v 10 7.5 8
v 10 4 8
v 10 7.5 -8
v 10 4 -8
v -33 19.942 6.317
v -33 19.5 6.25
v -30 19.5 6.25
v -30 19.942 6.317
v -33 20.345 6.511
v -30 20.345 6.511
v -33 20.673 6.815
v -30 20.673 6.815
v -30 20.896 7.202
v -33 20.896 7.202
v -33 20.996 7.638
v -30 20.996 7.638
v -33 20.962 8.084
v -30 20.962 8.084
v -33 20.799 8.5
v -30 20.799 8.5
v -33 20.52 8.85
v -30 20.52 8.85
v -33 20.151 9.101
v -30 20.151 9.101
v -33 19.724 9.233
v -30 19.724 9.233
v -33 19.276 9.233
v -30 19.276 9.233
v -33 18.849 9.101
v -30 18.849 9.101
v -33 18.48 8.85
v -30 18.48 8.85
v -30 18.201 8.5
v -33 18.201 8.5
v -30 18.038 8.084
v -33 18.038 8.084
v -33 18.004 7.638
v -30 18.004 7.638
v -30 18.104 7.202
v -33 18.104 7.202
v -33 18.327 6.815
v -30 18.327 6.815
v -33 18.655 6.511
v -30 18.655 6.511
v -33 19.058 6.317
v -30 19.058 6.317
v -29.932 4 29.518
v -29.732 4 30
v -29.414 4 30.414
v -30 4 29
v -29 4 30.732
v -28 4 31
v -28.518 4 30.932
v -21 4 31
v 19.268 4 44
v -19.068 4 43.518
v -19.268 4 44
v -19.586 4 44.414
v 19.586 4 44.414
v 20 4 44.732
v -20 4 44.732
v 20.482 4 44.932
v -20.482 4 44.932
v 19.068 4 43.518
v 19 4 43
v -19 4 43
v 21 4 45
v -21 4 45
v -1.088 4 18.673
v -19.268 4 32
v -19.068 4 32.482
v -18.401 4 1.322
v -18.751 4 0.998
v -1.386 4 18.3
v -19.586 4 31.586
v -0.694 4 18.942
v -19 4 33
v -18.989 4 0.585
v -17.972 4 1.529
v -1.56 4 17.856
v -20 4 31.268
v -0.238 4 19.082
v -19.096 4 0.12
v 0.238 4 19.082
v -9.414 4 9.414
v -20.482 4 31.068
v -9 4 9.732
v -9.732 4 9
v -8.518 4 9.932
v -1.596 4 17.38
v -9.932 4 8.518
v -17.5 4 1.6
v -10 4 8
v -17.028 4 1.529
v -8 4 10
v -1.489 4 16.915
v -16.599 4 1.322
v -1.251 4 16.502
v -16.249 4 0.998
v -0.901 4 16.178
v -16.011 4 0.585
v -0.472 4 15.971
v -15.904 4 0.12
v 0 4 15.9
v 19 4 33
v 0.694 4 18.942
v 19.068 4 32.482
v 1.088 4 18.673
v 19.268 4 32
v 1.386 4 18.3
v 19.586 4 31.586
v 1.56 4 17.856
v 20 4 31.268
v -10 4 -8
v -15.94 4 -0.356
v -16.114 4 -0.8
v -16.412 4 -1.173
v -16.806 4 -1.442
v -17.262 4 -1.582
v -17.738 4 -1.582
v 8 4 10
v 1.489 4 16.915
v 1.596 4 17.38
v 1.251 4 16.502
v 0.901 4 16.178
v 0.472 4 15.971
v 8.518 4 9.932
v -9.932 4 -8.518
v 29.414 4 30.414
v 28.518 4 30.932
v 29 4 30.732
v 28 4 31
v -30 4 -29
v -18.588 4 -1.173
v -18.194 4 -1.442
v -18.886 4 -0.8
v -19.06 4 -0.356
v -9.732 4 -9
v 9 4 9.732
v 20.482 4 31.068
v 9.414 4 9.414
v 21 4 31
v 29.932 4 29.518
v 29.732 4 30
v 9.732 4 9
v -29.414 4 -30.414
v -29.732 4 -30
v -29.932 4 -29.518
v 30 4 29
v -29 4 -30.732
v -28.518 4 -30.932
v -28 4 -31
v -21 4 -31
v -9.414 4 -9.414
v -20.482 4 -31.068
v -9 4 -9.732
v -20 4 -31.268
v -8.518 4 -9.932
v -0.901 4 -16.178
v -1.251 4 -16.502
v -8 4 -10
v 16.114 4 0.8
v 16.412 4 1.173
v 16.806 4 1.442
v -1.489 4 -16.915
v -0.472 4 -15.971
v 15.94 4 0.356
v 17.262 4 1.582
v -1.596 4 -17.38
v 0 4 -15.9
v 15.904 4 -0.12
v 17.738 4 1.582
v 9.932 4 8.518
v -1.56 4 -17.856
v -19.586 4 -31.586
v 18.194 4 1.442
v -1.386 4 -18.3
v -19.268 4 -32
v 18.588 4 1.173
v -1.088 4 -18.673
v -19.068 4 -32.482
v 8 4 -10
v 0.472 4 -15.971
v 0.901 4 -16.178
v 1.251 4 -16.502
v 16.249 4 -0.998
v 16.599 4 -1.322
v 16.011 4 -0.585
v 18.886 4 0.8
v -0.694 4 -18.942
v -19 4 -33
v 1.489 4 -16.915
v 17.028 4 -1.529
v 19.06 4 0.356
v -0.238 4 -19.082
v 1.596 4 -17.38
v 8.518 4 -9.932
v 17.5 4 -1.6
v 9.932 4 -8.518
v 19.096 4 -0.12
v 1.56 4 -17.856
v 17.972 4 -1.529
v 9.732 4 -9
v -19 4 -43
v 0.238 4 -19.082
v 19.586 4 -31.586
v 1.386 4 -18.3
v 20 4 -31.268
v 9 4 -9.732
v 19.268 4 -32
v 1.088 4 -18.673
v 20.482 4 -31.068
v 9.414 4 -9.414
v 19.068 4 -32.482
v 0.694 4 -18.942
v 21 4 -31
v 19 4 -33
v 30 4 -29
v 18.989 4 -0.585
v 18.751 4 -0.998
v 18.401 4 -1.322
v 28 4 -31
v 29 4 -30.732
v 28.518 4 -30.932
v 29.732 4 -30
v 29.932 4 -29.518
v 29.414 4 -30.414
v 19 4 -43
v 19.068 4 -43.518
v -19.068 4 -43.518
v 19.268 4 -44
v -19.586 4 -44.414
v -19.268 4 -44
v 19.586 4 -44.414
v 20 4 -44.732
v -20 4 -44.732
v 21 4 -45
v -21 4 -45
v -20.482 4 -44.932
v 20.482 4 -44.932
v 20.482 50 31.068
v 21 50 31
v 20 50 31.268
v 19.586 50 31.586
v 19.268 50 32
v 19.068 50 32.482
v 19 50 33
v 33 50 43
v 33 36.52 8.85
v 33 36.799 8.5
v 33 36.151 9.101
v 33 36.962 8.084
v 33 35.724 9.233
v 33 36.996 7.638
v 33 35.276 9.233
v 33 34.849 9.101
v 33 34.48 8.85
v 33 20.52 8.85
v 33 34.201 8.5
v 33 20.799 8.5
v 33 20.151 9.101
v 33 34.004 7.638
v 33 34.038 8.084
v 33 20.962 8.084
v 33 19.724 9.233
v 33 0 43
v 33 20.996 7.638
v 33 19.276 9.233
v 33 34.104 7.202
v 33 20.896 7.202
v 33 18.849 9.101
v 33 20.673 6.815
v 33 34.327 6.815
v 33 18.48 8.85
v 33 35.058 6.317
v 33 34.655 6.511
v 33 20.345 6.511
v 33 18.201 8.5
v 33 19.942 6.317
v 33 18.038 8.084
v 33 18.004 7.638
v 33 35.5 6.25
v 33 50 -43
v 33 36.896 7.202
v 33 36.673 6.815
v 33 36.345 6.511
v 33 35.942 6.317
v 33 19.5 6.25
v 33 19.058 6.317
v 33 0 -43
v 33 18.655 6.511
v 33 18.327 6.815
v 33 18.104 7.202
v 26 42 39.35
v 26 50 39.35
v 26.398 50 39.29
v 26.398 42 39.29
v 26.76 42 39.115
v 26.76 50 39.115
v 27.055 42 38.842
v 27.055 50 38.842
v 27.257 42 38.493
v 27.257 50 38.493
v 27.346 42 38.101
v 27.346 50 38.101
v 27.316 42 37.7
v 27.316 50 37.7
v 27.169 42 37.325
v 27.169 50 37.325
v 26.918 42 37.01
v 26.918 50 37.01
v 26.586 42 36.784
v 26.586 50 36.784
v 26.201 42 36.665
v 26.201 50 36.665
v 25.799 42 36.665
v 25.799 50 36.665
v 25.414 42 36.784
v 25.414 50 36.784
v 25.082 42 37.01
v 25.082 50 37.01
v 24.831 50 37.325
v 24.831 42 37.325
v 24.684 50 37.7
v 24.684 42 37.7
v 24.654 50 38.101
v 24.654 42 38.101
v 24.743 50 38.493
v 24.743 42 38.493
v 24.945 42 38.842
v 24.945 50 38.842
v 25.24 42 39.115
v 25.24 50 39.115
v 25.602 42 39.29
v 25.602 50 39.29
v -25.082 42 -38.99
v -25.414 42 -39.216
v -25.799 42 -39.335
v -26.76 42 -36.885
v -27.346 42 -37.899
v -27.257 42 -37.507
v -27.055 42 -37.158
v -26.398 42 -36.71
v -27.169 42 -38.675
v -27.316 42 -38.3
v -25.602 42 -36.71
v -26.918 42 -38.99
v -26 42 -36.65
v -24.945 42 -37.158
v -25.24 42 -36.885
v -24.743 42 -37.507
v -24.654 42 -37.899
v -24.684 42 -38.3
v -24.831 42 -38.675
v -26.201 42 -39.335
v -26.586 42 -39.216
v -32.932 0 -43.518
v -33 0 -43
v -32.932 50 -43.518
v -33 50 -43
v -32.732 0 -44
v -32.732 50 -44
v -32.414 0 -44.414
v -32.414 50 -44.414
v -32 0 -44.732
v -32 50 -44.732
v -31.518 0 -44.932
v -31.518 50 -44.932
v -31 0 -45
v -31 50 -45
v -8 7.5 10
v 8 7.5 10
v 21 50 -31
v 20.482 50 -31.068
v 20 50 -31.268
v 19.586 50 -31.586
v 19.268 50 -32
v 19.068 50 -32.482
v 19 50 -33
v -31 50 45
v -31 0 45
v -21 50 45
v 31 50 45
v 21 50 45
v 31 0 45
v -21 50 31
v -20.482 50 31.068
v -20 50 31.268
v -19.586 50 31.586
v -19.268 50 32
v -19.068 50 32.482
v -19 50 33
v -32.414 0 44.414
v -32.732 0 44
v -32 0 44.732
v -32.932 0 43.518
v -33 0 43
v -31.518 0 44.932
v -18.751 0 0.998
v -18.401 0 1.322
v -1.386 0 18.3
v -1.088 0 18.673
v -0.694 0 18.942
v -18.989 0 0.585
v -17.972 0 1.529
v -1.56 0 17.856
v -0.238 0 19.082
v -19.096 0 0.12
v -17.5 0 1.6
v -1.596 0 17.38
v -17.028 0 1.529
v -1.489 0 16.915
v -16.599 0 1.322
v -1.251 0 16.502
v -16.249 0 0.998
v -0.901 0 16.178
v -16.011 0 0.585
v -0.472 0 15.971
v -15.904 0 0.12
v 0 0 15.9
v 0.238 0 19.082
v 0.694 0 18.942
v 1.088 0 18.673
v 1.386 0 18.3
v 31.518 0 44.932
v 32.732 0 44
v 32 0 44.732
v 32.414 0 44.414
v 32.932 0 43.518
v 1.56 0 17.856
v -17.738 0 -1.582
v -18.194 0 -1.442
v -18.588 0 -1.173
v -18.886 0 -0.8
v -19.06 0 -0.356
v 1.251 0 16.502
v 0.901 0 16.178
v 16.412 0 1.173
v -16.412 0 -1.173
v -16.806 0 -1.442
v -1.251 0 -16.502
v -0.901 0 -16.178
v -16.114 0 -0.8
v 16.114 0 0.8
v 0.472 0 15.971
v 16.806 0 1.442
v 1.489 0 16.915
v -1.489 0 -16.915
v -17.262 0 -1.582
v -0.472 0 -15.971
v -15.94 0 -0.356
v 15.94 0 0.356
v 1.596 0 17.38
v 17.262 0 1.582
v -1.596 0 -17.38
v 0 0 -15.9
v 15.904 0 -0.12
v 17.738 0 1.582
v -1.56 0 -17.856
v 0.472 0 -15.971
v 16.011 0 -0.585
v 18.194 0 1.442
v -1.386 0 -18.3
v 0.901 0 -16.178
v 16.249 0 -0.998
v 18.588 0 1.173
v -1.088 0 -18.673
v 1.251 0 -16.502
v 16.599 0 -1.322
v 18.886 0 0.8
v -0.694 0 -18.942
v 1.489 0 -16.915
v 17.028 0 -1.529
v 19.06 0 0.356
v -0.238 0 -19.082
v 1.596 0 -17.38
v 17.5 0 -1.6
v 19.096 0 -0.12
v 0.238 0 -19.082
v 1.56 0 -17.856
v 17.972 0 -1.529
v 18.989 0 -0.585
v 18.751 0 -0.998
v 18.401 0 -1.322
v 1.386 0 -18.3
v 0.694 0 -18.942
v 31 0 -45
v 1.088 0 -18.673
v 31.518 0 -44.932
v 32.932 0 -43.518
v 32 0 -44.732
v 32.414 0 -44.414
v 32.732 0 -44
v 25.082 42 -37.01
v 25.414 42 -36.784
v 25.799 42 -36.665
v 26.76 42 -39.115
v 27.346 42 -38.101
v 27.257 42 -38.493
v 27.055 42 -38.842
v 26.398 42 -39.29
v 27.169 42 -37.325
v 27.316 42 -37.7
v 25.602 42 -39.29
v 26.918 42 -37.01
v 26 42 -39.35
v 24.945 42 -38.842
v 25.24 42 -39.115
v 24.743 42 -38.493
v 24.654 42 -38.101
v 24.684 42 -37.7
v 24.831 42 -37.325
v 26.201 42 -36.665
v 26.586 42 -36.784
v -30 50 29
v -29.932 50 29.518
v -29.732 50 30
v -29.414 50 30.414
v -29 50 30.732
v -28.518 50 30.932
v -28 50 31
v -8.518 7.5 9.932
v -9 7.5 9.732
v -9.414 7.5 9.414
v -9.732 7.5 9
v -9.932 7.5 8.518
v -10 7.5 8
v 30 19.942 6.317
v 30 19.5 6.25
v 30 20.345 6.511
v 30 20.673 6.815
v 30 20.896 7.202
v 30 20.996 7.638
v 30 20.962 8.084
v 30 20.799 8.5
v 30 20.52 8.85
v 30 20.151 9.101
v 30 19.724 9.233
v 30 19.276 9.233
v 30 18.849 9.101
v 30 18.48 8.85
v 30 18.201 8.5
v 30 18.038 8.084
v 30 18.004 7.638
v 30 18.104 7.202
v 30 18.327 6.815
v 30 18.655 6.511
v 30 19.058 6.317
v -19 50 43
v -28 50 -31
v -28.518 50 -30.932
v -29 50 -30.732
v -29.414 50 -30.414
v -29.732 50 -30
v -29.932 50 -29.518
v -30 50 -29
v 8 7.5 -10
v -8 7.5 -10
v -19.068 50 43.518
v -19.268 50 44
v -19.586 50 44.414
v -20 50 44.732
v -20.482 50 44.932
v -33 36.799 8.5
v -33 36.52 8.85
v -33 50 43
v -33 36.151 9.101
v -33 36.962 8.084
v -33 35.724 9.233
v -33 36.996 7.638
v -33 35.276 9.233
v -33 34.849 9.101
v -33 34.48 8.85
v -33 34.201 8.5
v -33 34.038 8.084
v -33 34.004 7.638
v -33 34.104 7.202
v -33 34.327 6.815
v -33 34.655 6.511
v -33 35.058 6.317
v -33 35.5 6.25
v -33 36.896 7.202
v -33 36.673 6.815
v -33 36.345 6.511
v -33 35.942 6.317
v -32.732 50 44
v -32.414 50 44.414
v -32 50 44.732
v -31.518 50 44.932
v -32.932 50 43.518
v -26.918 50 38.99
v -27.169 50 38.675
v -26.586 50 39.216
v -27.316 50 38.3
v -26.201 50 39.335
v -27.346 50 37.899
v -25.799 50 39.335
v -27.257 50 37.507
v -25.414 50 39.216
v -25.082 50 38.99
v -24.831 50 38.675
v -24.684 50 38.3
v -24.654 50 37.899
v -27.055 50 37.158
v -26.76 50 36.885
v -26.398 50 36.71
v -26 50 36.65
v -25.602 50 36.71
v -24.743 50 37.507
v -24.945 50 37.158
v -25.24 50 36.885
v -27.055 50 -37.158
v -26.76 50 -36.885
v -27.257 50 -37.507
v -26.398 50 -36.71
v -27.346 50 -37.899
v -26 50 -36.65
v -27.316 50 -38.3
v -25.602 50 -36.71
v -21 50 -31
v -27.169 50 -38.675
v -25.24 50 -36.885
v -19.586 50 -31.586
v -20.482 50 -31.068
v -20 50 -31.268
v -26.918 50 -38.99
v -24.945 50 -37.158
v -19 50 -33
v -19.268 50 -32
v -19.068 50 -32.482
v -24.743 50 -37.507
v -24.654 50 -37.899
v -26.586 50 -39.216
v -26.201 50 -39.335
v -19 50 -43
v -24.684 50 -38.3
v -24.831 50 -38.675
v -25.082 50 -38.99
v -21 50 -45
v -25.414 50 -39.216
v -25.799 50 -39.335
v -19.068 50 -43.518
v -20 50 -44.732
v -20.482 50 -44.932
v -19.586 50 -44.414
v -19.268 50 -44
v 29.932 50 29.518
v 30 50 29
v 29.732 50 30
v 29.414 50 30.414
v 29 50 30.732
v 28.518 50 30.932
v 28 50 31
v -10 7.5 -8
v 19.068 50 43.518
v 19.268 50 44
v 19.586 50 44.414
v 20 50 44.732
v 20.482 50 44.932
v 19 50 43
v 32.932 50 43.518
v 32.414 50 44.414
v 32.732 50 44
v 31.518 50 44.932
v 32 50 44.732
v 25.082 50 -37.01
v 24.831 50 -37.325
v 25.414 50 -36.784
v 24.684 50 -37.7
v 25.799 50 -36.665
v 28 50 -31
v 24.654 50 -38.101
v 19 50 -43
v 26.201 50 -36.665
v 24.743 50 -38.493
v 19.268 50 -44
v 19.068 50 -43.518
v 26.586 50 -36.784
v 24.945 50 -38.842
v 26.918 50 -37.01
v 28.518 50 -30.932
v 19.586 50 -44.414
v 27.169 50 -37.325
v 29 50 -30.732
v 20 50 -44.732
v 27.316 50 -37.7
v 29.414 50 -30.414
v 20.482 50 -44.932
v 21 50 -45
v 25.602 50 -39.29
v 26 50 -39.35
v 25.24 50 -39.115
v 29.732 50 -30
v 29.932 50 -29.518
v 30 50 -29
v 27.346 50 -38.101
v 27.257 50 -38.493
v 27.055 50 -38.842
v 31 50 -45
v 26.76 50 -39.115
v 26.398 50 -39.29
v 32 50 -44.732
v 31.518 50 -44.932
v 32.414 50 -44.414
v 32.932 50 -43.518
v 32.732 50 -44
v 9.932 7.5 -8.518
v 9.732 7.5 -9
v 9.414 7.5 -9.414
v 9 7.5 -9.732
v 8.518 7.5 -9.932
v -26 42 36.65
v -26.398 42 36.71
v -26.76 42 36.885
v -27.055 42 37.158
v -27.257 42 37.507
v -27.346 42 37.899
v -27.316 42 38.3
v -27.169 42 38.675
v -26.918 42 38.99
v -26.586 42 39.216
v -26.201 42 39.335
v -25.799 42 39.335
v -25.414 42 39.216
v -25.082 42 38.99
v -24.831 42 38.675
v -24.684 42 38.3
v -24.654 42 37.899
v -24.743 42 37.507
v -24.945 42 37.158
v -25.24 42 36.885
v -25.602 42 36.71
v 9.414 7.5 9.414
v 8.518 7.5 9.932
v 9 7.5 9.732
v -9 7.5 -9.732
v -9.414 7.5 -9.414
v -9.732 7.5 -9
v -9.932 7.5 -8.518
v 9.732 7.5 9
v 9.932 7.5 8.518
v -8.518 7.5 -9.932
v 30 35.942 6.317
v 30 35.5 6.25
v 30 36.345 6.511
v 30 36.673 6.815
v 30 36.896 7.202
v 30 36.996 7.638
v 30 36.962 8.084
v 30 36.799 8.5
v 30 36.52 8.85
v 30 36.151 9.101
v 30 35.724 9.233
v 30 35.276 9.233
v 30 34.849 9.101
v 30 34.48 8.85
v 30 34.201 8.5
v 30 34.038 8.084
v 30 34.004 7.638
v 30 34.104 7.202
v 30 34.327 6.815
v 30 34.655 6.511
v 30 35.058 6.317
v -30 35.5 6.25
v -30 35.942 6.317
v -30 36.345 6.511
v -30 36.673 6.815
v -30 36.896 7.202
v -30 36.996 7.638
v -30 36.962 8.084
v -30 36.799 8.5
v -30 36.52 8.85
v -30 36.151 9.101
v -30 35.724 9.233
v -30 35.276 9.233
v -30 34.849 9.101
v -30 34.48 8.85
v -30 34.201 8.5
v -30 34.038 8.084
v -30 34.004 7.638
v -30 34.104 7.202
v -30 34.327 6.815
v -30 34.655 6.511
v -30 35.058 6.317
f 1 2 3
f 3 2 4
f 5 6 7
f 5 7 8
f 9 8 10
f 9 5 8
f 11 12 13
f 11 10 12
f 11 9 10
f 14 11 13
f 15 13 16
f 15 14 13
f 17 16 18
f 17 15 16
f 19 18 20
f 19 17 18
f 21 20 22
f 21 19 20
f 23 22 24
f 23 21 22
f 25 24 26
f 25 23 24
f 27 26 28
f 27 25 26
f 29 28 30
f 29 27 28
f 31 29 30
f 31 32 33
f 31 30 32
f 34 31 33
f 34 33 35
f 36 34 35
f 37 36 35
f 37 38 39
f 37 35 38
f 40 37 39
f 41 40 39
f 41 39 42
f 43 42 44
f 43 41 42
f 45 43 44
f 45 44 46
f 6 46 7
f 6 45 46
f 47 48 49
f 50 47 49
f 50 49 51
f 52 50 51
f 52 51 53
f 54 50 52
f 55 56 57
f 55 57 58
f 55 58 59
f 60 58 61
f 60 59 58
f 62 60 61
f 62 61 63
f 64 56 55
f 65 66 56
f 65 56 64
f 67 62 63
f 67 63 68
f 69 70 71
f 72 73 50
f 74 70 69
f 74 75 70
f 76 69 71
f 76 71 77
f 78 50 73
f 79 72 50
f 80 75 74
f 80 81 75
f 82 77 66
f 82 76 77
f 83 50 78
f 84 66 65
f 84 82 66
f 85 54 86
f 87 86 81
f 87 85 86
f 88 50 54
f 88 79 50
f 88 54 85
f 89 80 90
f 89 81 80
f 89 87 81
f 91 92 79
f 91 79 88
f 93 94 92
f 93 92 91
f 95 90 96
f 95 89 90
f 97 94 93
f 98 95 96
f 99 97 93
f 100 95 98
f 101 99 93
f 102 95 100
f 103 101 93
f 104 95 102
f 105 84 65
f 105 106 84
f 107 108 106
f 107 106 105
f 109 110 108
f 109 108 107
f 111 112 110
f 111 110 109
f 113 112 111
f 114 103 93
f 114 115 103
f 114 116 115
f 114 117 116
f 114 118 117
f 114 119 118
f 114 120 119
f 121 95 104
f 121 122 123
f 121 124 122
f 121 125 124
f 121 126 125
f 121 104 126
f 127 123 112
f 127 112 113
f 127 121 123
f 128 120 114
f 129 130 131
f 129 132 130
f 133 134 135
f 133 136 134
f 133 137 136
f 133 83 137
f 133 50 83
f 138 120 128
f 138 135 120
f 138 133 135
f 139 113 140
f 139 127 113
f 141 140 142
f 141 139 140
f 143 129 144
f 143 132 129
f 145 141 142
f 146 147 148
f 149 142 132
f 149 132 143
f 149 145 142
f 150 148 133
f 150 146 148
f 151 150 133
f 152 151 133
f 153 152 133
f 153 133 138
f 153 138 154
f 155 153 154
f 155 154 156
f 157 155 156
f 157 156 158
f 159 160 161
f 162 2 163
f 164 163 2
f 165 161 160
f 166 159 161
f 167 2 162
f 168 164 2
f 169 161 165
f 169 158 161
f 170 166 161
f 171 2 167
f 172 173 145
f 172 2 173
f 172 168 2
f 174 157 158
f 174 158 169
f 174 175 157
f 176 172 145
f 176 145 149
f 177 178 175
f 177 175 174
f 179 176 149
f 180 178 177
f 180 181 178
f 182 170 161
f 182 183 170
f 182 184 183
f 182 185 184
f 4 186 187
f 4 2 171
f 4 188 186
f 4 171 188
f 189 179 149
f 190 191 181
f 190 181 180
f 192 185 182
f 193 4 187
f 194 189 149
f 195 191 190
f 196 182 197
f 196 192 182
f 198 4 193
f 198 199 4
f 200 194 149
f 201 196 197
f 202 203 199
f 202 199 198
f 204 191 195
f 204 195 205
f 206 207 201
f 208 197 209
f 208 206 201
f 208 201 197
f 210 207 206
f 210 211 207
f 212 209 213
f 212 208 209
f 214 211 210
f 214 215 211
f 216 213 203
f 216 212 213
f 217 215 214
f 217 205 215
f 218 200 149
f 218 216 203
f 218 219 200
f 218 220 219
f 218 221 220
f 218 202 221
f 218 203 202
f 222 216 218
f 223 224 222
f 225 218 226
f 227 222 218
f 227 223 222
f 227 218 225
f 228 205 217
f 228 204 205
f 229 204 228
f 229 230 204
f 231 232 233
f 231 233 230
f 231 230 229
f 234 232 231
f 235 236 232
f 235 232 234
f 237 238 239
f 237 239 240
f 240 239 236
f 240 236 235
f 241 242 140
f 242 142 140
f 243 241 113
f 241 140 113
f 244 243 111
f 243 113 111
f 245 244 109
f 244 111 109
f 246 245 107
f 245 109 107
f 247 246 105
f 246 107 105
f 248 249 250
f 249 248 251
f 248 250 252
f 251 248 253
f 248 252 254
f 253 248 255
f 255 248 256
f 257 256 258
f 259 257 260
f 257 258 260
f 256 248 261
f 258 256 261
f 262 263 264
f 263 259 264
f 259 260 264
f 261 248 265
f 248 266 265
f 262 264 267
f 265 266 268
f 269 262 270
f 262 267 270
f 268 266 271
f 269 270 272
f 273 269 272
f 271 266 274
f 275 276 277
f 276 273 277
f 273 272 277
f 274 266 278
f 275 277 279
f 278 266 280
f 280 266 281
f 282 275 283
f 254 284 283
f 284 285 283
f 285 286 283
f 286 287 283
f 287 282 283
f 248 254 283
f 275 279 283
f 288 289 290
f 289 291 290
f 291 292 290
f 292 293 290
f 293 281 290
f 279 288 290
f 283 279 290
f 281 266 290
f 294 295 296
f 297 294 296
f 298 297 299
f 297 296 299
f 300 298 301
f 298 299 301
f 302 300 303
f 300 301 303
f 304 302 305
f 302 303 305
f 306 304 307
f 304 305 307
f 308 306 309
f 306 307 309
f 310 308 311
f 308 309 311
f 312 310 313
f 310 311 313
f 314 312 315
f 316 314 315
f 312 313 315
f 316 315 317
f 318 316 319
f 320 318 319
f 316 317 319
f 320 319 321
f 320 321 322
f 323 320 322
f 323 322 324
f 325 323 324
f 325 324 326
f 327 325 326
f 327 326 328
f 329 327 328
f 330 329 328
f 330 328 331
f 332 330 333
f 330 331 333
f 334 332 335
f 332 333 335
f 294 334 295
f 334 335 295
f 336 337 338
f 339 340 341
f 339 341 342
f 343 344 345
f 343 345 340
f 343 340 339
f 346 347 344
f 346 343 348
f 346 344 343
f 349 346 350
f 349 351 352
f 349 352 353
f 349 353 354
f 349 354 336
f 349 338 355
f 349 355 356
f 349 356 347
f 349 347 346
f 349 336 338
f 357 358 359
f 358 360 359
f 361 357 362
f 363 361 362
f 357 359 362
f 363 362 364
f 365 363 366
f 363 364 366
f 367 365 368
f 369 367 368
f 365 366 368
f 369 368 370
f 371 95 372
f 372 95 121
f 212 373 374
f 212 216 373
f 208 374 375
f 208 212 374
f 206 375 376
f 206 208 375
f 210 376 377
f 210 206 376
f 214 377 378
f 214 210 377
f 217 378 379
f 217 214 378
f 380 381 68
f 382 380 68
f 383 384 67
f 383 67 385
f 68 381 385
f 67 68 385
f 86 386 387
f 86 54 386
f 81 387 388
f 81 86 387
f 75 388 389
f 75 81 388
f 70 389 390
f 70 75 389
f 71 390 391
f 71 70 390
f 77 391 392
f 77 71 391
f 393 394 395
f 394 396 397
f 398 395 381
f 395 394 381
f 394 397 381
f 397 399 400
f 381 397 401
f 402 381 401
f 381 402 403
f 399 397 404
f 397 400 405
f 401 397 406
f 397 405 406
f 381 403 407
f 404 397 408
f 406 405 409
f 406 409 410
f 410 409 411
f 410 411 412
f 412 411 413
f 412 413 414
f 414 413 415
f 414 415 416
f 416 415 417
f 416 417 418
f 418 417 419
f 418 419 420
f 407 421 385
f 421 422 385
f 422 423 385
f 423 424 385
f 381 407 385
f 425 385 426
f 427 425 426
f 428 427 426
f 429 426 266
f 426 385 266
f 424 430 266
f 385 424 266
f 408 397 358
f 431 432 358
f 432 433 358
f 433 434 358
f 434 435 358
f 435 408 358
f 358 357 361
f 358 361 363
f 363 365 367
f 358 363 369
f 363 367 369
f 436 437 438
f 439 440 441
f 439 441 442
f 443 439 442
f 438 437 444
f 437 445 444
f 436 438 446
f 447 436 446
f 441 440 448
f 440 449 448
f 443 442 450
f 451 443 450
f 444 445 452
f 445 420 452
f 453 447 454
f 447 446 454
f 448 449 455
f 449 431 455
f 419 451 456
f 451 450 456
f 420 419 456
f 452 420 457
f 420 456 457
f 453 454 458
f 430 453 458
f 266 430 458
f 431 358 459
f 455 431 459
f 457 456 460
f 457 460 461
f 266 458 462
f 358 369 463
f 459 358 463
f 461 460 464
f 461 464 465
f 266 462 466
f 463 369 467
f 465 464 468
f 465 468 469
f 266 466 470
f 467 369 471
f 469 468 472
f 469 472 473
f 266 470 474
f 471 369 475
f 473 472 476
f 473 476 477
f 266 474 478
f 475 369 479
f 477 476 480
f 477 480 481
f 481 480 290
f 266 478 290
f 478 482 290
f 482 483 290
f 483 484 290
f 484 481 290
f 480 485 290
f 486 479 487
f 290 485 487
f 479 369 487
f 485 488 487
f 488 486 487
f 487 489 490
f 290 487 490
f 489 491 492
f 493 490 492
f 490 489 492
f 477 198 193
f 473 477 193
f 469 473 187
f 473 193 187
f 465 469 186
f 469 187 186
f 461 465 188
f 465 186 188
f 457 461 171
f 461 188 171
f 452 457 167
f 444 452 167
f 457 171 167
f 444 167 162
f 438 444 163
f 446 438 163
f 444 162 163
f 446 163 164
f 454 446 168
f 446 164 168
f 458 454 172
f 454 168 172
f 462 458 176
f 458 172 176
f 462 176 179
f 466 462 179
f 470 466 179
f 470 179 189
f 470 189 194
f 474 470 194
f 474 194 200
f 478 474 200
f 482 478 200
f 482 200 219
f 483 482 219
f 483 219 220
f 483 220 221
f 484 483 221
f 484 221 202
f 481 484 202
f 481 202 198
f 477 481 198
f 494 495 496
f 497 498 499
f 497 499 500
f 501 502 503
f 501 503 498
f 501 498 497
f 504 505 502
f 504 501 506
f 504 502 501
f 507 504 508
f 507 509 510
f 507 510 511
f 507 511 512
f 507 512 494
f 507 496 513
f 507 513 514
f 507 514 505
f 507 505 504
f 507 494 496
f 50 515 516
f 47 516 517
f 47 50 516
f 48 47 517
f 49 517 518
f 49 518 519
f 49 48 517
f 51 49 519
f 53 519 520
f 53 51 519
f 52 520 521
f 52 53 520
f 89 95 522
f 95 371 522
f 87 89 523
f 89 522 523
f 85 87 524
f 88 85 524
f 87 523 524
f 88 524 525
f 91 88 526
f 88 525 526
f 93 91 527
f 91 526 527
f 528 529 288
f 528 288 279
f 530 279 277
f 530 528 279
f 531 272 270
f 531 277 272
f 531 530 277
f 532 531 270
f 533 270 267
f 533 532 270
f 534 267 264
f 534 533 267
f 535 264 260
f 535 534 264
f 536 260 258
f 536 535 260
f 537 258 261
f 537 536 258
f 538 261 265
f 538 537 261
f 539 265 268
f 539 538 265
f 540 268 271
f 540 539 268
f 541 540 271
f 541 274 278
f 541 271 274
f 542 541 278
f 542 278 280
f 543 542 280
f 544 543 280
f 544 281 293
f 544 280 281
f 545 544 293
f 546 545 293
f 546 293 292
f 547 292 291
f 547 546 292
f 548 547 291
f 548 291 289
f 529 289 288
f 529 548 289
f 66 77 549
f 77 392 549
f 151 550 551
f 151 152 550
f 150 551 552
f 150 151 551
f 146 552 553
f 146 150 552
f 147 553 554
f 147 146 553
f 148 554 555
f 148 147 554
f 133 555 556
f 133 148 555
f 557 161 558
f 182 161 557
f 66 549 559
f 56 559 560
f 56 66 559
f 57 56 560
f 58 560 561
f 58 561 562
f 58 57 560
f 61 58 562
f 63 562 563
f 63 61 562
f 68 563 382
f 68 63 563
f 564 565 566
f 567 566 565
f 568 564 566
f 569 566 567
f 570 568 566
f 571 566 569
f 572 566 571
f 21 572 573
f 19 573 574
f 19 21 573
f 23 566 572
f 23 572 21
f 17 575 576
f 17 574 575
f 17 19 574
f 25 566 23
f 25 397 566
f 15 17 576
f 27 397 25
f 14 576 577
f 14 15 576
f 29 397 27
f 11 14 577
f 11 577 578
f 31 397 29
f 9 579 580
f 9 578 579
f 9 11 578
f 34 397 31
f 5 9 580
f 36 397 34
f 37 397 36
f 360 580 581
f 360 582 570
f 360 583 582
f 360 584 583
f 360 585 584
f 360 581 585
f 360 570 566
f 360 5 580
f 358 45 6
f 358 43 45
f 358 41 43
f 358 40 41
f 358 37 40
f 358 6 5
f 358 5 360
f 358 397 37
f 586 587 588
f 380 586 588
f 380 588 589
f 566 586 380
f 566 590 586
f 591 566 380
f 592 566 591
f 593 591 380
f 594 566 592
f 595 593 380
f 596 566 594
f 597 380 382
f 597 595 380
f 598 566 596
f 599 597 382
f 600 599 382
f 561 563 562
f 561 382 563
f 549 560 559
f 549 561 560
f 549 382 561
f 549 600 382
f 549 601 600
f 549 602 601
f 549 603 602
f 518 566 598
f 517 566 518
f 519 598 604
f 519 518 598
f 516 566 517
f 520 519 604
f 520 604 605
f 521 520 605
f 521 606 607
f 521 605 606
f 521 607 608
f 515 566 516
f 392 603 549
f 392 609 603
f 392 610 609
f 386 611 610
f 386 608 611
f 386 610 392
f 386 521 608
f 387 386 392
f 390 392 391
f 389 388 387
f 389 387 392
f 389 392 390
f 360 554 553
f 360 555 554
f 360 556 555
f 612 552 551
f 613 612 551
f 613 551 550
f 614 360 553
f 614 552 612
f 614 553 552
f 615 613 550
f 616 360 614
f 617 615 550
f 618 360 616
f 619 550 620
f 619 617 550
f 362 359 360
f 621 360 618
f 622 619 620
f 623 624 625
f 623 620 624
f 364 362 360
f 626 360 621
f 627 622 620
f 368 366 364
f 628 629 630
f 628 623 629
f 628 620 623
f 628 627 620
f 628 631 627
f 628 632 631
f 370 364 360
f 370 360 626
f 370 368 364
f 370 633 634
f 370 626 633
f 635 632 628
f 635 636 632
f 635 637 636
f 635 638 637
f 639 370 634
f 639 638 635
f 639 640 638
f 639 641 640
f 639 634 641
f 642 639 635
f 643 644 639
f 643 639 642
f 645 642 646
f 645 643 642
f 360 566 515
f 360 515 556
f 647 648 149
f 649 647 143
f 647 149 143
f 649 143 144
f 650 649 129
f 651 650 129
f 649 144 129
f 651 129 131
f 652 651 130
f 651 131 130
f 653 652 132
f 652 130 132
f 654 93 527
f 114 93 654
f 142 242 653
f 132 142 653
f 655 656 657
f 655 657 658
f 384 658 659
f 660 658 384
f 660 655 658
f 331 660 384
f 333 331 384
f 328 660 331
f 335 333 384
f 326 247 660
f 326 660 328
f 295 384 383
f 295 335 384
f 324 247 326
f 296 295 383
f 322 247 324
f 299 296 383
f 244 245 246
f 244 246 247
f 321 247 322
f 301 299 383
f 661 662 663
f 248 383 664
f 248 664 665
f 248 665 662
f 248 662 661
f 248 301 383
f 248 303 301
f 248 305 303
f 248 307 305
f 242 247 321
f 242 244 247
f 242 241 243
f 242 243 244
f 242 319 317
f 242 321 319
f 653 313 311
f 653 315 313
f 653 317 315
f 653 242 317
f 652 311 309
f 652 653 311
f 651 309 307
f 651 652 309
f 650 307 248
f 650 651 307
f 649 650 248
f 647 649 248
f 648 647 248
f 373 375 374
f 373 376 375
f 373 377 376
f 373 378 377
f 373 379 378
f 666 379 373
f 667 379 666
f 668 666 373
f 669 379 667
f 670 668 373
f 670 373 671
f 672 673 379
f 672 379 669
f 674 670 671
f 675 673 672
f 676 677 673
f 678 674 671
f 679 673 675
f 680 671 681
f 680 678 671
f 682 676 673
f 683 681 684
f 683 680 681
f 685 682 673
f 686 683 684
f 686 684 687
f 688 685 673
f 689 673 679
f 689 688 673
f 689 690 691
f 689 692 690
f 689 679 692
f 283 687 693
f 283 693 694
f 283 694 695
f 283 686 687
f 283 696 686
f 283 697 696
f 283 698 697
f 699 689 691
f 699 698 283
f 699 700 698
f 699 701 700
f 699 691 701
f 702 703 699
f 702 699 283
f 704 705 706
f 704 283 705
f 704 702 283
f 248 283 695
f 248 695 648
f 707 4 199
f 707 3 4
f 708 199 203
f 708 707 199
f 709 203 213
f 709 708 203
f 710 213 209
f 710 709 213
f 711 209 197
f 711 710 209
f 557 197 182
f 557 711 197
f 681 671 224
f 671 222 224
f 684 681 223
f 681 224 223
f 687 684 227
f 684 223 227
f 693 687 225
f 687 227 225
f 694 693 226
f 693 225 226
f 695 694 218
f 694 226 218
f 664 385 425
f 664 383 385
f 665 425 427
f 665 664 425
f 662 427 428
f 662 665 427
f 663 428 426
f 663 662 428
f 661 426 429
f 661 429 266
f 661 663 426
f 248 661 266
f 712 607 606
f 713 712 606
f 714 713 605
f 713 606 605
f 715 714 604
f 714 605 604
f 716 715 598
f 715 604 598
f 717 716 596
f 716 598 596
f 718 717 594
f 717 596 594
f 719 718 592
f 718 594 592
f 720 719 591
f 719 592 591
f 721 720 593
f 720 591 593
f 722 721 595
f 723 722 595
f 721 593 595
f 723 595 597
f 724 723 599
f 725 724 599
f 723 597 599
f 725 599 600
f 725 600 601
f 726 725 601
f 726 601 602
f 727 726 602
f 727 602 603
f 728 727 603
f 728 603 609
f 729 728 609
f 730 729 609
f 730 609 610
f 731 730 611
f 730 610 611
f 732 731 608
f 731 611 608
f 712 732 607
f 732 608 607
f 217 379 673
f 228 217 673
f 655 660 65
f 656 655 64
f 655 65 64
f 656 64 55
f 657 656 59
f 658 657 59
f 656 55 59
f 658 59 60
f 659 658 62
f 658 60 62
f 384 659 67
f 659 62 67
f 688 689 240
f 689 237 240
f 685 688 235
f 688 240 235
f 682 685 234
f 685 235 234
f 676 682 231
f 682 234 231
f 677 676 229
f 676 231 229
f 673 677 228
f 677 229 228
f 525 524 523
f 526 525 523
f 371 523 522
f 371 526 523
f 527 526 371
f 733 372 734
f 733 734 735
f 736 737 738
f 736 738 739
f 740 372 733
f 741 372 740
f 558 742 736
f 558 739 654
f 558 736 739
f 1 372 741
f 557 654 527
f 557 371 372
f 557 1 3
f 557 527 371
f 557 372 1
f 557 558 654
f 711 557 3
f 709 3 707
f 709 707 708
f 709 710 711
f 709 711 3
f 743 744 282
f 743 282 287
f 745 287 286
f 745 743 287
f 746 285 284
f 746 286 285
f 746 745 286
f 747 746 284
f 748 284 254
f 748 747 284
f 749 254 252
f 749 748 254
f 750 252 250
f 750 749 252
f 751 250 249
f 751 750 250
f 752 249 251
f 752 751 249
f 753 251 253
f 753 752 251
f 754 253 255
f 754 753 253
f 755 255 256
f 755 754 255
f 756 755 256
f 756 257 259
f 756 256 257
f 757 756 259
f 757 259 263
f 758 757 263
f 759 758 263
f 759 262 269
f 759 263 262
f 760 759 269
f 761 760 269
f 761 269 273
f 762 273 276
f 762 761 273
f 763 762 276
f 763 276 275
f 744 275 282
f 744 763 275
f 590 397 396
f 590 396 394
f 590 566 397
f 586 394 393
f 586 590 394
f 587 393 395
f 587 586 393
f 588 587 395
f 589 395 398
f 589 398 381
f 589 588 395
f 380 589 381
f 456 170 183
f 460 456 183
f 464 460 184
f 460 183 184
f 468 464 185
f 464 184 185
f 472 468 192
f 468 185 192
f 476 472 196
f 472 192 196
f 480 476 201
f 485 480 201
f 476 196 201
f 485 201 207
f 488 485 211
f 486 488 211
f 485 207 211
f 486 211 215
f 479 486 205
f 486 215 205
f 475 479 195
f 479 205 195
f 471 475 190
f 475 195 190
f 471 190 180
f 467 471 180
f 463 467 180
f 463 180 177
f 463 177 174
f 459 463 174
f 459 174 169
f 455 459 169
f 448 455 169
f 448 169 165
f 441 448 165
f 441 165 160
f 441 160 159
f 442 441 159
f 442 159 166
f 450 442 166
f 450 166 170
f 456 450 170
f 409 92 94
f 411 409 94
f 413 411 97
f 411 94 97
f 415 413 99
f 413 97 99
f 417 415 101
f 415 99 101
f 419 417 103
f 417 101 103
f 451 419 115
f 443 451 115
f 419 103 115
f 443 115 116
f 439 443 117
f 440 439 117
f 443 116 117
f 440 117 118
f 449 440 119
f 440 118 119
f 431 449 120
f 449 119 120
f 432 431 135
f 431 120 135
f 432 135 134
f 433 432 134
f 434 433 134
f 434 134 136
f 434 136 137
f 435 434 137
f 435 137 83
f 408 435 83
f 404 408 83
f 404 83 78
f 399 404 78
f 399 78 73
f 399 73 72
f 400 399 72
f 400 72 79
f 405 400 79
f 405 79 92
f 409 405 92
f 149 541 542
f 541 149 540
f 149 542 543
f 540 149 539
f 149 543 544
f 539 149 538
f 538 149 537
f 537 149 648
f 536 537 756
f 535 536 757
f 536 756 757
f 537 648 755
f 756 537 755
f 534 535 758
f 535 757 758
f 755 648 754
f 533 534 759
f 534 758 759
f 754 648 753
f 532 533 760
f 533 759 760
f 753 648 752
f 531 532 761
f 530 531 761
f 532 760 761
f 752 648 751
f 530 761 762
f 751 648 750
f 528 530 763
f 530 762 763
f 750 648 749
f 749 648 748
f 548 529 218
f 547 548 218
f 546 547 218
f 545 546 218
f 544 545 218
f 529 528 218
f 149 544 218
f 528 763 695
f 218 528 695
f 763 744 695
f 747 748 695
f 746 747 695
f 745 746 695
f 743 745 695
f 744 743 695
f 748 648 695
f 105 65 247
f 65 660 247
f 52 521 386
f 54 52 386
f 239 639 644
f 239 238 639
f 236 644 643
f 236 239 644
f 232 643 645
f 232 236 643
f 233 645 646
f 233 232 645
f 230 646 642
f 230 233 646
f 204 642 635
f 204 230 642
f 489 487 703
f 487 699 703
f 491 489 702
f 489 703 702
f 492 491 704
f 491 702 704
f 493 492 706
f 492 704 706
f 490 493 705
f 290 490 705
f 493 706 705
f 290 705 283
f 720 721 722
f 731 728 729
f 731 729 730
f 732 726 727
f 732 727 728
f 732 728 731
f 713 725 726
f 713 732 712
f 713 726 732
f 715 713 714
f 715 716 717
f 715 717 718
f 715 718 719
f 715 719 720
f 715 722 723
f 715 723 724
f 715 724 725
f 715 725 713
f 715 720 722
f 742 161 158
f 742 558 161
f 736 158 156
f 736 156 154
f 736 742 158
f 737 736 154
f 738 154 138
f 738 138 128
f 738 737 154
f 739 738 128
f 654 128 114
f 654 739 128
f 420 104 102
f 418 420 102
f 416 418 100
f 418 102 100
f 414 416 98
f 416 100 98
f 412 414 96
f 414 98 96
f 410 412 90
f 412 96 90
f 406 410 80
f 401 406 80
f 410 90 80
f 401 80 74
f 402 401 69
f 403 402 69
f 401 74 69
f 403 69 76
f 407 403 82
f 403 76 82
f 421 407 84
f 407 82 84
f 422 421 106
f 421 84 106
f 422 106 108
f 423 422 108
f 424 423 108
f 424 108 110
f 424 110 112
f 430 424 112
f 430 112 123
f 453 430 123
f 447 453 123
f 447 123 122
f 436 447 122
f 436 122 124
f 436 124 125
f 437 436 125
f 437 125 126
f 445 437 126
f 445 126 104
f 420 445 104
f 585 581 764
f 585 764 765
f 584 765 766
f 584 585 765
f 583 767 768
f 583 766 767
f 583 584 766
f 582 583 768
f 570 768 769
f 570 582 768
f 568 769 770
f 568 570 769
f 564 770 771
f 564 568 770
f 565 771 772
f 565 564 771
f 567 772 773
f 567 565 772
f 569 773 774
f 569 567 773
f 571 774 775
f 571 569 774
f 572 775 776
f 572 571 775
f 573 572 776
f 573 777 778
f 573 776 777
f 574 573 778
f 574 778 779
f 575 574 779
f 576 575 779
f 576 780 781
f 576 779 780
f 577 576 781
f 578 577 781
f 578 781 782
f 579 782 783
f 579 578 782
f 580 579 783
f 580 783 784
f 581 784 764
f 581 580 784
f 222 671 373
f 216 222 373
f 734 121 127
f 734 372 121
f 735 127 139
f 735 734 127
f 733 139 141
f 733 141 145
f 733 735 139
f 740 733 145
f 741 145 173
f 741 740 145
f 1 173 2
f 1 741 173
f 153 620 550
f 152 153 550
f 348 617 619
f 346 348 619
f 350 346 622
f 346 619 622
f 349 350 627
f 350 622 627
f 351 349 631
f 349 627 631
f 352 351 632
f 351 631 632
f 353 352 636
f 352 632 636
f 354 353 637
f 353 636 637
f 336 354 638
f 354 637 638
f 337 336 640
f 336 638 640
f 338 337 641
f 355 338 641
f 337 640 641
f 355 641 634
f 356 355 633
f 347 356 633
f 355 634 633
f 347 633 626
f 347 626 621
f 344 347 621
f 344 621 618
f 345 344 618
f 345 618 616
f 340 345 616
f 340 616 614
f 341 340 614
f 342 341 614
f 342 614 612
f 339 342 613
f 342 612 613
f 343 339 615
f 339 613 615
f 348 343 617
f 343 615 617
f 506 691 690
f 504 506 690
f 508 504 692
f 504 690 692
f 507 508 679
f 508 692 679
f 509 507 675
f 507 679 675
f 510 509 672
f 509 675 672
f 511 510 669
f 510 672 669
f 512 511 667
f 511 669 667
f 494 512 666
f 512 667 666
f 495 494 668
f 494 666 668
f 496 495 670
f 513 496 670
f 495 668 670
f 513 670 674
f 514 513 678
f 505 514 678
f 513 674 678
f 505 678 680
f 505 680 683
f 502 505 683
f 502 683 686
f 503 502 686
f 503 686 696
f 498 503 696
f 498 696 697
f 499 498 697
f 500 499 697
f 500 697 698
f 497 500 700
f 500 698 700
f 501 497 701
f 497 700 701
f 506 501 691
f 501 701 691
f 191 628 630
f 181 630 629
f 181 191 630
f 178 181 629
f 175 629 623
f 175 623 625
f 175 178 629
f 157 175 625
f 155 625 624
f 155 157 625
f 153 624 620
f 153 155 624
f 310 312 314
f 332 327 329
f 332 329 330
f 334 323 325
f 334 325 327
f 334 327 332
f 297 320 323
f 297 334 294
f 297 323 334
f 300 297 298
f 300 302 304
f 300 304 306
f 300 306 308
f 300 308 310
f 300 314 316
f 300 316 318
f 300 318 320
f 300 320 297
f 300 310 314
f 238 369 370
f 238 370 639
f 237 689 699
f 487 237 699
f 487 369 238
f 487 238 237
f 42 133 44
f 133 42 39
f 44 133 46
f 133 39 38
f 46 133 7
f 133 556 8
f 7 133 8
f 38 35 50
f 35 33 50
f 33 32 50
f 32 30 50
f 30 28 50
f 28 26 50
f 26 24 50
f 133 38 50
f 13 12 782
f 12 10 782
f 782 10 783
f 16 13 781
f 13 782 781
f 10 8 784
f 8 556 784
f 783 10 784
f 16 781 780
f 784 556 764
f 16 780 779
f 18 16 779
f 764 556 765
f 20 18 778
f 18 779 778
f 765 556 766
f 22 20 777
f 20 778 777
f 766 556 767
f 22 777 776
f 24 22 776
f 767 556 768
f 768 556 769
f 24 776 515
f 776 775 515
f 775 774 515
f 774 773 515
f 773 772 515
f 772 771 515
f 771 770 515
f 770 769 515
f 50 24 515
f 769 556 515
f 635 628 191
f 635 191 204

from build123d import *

# Parameters (mm, degrees)
SKETCH1_W               = 66
SKETCH1_H               = 90
BOSS_EXTRUDE1_DEPTH     = 50
SKETCH2_R               = 1.35
CUT_EXTRUDE1_DEPTH      = 8
CUT_EXTRUDE2_DEPTH      = 46
FILLET1_R               = 2
SKETCH4_W               = 38
SKETCH4_H               = 3
CUT_EXTRUDE3_DEPTH      = 46
FILLET4_R               = 2
SKETCH5_R               = 1.6
CUT_EXTRUDE4_DEPTH      = 73.318738927
SKETCH6_W               = 20
SKETCH6_H               = 20
BOSS_EXTRUDE2_DEPTH     = 3.5
FILLET5_R               = 2
CUT_EXTRUDE5_DEPTH      = 93.16289926
CUT_EXTRUDE5_DEPTH_BACK = 93.16289926
SKETCH7_R               = 1.5


with BuildPart() as part:
    # Sketch1 → Boss-Extrude1 (new body)
    with BuildSketch(Plane(origin=(0, 0, 0), x_dir=(1, 0, 0), z_dir=(0, 1, 0))):
        Rectangle(SKETCH1_W, SKETCH1_H)
    extrude(amount=BOSS_EXTRUDE1_DEPTH)

    # Sketch2 → Cut-Extrude1 (cut)
    with BuildSketch(Plane(origin=(0, 50, 0), x_dir=(1, 0, 0), z_dir=(0, 1, 0))):
        with Locations(Location((-26, 38, 0), (0, 0, 270))):
            Circle(SKETCH2_R)
        with Locations(Location((26, 38, 0), (0, 0, 90))):
            Circle(SKETCH2_R)
        with Locations(Location((26, -38, 0), (0, 0, 270))):
            Circle(SKETCH2_R)
        with Locations(Location((-26, -38, 0), (0, 0, 90))):
            Circle(SKETCH2_R)
    extrude(amount=-CUT_EXTRUDE1_DEPTH, mode=Mode.SUBTRACT)

    # Sketch3 → Cut-Extrude2 (cut)
    with BuildSketch(Plane(origin=(0, 50, 0), x_dir=(1, 0, 0), z_dir=(0, 1, 0))):
        Polygon((-19, -42), (19, -42), (19, -31), (30, -31), (30, 31), (19, 31), (19, 42), (-19, 42), (-19, 31), (-30, 31), (-30, -31), (-19, -31), align=None)
    extrude(amount=-CUT_EXTRUDE2_DEPTH, mode=Mode.SUBTRACT)

    # Fillet1
    fillet1_edges = [part.edges().sort_by_distance(p)[0] for p in [
        (-33, 25, -45),
        (33, 25, -45),
        (33, 25, 45),
        (-33, 25, 45),
    ]]
    fillet(fillet1_edges, radius=FILLET1_R)

    # Sketch4 → Cut-Extrude3 (cut)
    with BuildSketch(Plane(origin=(0, 50, 0), x_dir=(1, 0, 0), z_dir=(0, 1, 0))):
        with Locations((0, 43.5)):
            Rectangle(SKETCH4_W, SKETCH4_H)
        with Locations((0, -43.5)):
            Rectangle(SKETCH4_W, SKETCH4_H)
    extrude(amount=-CUT_EXTRUDE3_DEPTH, mode=Mode.SUBTRACT)

    # Fillet4
    fillet4_edges = [part.edges().sort_by_distance(p)[0] for p in [
        (-19, 27, 31),
        (-30, 27, 31),
        (-30, 27, -31),
        (-19, 27, -31),
        (19, 27, -31),
        (30, 27, -31),
        (30, 27, 31),
        (19, 27, 31),
        (-19, 27, -45),
        (19, 27, -45),
        (-19, 27, 45),
        (19, 27, 45),
    ]]
    fillet(fillet4_edges, radius=FILLET4_R)

    # Sketch5 → Cut-Extrude4 (cut, through all)
    with BuildSketch(Plane(origin=(0, 4, 0), x_dir=(1, 0, 0), z_dir=(0, 1, 0))):
        with Locations(Location((-17.5, 0, 0), (0, 0, 270))):
            Circle(SKETCH5_R)
        with Locations(Location((0, 17.5, 0), (0, 0, 270))):
            Circle(SKETCH5_R)
        with Locations(Location((0, -17.5, 0), (0, 0, 90))):
            Circle(SKETCH5_R)
        with Locations(Location((17.5, 0, 0), (0, 0, 90))):
            Circle(SKETCH5_R)
    extrude(amount=-CUT_EXTRUDE4_DEPTH, mode=Mode.SUBTRACT)

    # Sketch6 → Boss-Extrude2 (add)
    with BuildSketch(Plane(origin=(0, 4, 0), x_dir=(1, 0, 0), z_dir=(0, 1, 0))):
        Rectangle(SKETCH6_W, SKETCH6_H)
    extrude(amount=BOSS_EXTRUDE2_DEPTH)

    # Fillet5
    fillet5_edges = [part.edges().sort_by_distance(p)[0] for p in [
        (-10, 5.75, -10),
        (-10, 5.75, 10),
        (10, 5.75, 10),
        (10, 5.75, -10),
    ]]
    fillet(fillet5_edges, radius=FILLET5_R)

    # Sketch7 → Cut-Extrude5 (cut, two sides: drawn at the far end of the back side and taken through both)
    with BuildSketch(Plane(origin=(-30, 0, 0), x_dir=(0, 0, -1), z_dir=(1, 0, 0)).offset(-CUT_EXTRUDE5_DEPTH_BACK)):
        with Locations((-7.75, 19.5)):
            Circle(SKETCH7_R)
        with Locations((-7.75, 35.5)):
            Circle(SKETCH7_R)
    extrude(amount=CUT_EXTRUDE5_DEPTH + CUT_EXTRUDE5_DEPTH_BACK, mode=Mode.SUBTRACT)


solid = part.part
